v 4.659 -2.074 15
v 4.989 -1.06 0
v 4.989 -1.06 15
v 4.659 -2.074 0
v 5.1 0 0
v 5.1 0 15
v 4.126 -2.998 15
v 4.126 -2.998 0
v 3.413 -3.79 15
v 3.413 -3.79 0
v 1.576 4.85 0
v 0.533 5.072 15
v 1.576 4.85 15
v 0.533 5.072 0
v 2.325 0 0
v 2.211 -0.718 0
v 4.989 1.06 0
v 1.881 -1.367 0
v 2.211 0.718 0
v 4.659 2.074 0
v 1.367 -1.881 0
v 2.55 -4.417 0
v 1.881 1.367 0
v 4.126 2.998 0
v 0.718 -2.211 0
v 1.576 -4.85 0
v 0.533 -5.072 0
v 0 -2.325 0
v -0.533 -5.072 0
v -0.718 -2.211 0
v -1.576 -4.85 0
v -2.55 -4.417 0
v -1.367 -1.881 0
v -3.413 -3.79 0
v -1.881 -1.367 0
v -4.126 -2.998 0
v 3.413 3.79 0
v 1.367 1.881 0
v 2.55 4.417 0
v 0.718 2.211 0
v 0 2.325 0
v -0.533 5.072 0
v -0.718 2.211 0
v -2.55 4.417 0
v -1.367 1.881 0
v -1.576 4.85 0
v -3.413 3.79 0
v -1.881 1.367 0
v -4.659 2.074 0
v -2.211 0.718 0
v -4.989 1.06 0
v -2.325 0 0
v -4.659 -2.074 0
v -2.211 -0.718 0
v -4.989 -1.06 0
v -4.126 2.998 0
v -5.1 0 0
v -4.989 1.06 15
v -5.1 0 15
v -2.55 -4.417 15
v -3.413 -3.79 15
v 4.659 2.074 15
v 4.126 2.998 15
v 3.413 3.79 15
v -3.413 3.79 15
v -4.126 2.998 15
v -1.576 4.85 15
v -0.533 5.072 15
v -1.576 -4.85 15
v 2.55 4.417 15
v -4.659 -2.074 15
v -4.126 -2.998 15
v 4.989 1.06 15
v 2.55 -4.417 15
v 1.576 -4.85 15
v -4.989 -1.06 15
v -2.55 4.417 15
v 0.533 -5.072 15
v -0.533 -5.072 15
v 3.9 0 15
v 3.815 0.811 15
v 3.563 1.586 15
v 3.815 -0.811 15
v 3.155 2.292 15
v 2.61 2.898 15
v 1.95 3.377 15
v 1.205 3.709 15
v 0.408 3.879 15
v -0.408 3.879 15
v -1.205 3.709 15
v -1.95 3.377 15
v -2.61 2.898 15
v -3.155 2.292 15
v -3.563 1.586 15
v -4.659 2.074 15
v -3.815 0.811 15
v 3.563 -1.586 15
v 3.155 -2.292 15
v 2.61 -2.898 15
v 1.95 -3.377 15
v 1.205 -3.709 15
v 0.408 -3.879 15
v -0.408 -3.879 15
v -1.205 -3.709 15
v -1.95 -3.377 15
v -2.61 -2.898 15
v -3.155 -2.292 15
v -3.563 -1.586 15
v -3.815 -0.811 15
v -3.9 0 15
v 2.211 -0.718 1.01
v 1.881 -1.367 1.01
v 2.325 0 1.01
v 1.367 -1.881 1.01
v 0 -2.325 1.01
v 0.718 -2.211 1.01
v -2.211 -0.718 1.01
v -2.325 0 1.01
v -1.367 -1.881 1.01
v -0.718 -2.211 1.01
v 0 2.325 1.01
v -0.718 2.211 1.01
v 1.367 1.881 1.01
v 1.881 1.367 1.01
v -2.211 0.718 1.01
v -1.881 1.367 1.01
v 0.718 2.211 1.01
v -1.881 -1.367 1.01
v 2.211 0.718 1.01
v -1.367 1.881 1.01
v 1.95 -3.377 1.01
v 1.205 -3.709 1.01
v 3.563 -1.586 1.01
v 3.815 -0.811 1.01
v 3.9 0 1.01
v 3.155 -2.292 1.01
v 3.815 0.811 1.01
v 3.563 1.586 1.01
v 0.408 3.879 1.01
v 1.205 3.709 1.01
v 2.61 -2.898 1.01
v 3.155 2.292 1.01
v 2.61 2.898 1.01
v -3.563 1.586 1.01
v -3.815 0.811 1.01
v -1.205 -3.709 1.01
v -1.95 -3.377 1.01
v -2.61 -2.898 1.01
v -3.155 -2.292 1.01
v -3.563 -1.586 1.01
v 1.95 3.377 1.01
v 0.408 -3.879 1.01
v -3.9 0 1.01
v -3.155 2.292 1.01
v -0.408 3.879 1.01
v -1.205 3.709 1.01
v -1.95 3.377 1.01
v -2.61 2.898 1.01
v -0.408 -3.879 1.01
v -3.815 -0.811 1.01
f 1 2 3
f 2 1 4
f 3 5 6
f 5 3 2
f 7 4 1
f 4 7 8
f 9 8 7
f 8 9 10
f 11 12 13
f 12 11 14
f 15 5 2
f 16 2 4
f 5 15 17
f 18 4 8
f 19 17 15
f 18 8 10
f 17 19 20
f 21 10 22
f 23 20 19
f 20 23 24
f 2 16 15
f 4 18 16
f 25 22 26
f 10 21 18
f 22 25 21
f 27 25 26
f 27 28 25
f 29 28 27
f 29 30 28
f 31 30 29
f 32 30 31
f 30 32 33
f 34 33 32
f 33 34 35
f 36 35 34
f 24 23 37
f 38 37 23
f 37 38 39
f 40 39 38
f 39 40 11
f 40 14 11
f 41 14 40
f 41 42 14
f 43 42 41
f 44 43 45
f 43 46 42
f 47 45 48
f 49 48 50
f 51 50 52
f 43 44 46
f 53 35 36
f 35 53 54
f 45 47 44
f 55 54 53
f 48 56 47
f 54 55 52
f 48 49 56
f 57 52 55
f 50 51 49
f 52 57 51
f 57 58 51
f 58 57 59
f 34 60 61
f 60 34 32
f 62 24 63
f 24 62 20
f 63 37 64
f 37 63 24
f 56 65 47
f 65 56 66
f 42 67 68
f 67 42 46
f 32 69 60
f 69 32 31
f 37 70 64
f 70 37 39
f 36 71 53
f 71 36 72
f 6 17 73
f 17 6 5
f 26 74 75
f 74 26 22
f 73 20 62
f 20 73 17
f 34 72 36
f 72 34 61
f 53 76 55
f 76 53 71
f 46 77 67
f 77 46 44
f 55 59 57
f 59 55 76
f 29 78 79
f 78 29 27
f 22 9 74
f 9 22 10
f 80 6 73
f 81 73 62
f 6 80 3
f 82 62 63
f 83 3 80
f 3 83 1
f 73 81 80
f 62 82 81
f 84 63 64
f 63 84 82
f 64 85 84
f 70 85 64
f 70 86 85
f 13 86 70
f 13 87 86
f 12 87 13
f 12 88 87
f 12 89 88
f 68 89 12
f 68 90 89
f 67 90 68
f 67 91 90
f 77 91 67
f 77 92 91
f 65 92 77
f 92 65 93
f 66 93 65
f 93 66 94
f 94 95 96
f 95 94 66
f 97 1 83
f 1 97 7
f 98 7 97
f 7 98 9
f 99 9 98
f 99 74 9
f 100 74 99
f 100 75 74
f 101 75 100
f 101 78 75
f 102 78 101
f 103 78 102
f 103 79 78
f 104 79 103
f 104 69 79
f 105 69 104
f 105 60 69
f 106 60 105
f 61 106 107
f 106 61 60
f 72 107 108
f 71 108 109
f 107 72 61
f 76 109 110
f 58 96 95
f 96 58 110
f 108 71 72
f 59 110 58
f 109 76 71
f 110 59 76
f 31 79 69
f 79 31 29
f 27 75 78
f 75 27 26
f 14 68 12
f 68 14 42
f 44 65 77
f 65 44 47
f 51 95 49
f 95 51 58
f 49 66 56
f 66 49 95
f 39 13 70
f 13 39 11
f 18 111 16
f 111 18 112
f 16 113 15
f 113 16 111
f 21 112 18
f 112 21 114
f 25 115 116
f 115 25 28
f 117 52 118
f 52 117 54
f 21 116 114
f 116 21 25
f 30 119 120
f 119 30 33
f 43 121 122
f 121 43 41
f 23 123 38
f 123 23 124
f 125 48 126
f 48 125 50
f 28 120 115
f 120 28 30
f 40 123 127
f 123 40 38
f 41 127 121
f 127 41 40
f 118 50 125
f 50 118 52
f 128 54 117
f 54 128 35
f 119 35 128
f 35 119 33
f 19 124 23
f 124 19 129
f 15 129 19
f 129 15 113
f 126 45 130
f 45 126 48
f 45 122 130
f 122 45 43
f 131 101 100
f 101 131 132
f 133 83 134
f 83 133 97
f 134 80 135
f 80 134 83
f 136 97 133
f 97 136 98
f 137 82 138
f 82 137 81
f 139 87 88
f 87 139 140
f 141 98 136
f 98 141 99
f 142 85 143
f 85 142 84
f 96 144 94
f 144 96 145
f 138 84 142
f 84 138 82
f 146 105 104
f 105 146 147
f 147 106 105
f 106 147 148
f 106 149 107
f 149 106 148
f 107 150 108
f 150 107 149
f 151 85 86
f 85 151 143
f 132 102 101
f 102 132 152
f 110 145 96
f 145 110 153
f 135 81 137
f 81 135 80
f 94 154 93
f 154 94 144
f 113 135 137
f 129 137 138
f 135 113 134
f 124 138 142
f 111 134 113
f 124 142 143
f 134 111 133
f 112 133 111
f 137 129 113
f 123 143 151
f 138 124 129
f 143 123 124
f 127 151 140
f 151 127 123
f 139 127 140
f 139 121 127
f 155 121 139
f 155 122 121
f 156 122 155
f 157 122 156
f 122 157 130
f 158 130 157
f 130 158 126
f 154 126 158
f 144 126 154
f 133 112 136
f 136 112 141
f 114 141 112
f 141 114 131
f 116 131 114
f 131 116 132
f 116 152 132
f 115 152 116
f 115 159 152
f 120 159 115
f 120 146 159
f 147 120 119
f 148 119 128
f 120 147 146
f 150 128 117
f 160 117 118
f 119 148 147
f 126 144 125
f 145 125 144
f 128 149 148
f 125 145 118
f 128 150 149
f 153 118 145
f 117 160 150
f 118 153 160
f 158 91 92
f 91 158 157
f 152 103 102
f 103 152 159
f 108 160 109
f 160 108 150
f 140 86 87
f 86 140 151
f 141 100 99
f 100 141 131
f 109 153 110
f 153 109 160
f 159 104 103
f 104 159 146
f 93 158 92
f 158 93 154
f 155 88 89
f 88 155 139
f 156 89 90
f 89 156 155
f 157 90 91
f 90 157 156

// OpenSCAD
echo((4.7-0.3)*2);

post_h = 15;
hole = post_h-1; // relocate location of end of nut socket
washer_dia = 7+2*0.4;
post_dia = washer_dia+2*1.2;

translate([0,0,post_h]) rotate([180,0,0]) difference() {
    translate([0, 0, 0]) cylinder(h=post_h, d=post_dia, $fn=30);
    translate([0, 0, -1])  cylinder(h=post_h+2, d=4.65, $fn=20);
    translate([0, 0, -0.01]) cylinder(h=hole, d=washer_dia, $fn=30);  // nut socket
}

/*  
difference() {     // nut end
    translate([0, 0, 10]) cylinder(h=8, d=(4.7-0.3)*2, $fn=6);
    translate([0, 0, 9])  cylinder(h=10+2, d=4.65, $fn=20);
    
}
*/
